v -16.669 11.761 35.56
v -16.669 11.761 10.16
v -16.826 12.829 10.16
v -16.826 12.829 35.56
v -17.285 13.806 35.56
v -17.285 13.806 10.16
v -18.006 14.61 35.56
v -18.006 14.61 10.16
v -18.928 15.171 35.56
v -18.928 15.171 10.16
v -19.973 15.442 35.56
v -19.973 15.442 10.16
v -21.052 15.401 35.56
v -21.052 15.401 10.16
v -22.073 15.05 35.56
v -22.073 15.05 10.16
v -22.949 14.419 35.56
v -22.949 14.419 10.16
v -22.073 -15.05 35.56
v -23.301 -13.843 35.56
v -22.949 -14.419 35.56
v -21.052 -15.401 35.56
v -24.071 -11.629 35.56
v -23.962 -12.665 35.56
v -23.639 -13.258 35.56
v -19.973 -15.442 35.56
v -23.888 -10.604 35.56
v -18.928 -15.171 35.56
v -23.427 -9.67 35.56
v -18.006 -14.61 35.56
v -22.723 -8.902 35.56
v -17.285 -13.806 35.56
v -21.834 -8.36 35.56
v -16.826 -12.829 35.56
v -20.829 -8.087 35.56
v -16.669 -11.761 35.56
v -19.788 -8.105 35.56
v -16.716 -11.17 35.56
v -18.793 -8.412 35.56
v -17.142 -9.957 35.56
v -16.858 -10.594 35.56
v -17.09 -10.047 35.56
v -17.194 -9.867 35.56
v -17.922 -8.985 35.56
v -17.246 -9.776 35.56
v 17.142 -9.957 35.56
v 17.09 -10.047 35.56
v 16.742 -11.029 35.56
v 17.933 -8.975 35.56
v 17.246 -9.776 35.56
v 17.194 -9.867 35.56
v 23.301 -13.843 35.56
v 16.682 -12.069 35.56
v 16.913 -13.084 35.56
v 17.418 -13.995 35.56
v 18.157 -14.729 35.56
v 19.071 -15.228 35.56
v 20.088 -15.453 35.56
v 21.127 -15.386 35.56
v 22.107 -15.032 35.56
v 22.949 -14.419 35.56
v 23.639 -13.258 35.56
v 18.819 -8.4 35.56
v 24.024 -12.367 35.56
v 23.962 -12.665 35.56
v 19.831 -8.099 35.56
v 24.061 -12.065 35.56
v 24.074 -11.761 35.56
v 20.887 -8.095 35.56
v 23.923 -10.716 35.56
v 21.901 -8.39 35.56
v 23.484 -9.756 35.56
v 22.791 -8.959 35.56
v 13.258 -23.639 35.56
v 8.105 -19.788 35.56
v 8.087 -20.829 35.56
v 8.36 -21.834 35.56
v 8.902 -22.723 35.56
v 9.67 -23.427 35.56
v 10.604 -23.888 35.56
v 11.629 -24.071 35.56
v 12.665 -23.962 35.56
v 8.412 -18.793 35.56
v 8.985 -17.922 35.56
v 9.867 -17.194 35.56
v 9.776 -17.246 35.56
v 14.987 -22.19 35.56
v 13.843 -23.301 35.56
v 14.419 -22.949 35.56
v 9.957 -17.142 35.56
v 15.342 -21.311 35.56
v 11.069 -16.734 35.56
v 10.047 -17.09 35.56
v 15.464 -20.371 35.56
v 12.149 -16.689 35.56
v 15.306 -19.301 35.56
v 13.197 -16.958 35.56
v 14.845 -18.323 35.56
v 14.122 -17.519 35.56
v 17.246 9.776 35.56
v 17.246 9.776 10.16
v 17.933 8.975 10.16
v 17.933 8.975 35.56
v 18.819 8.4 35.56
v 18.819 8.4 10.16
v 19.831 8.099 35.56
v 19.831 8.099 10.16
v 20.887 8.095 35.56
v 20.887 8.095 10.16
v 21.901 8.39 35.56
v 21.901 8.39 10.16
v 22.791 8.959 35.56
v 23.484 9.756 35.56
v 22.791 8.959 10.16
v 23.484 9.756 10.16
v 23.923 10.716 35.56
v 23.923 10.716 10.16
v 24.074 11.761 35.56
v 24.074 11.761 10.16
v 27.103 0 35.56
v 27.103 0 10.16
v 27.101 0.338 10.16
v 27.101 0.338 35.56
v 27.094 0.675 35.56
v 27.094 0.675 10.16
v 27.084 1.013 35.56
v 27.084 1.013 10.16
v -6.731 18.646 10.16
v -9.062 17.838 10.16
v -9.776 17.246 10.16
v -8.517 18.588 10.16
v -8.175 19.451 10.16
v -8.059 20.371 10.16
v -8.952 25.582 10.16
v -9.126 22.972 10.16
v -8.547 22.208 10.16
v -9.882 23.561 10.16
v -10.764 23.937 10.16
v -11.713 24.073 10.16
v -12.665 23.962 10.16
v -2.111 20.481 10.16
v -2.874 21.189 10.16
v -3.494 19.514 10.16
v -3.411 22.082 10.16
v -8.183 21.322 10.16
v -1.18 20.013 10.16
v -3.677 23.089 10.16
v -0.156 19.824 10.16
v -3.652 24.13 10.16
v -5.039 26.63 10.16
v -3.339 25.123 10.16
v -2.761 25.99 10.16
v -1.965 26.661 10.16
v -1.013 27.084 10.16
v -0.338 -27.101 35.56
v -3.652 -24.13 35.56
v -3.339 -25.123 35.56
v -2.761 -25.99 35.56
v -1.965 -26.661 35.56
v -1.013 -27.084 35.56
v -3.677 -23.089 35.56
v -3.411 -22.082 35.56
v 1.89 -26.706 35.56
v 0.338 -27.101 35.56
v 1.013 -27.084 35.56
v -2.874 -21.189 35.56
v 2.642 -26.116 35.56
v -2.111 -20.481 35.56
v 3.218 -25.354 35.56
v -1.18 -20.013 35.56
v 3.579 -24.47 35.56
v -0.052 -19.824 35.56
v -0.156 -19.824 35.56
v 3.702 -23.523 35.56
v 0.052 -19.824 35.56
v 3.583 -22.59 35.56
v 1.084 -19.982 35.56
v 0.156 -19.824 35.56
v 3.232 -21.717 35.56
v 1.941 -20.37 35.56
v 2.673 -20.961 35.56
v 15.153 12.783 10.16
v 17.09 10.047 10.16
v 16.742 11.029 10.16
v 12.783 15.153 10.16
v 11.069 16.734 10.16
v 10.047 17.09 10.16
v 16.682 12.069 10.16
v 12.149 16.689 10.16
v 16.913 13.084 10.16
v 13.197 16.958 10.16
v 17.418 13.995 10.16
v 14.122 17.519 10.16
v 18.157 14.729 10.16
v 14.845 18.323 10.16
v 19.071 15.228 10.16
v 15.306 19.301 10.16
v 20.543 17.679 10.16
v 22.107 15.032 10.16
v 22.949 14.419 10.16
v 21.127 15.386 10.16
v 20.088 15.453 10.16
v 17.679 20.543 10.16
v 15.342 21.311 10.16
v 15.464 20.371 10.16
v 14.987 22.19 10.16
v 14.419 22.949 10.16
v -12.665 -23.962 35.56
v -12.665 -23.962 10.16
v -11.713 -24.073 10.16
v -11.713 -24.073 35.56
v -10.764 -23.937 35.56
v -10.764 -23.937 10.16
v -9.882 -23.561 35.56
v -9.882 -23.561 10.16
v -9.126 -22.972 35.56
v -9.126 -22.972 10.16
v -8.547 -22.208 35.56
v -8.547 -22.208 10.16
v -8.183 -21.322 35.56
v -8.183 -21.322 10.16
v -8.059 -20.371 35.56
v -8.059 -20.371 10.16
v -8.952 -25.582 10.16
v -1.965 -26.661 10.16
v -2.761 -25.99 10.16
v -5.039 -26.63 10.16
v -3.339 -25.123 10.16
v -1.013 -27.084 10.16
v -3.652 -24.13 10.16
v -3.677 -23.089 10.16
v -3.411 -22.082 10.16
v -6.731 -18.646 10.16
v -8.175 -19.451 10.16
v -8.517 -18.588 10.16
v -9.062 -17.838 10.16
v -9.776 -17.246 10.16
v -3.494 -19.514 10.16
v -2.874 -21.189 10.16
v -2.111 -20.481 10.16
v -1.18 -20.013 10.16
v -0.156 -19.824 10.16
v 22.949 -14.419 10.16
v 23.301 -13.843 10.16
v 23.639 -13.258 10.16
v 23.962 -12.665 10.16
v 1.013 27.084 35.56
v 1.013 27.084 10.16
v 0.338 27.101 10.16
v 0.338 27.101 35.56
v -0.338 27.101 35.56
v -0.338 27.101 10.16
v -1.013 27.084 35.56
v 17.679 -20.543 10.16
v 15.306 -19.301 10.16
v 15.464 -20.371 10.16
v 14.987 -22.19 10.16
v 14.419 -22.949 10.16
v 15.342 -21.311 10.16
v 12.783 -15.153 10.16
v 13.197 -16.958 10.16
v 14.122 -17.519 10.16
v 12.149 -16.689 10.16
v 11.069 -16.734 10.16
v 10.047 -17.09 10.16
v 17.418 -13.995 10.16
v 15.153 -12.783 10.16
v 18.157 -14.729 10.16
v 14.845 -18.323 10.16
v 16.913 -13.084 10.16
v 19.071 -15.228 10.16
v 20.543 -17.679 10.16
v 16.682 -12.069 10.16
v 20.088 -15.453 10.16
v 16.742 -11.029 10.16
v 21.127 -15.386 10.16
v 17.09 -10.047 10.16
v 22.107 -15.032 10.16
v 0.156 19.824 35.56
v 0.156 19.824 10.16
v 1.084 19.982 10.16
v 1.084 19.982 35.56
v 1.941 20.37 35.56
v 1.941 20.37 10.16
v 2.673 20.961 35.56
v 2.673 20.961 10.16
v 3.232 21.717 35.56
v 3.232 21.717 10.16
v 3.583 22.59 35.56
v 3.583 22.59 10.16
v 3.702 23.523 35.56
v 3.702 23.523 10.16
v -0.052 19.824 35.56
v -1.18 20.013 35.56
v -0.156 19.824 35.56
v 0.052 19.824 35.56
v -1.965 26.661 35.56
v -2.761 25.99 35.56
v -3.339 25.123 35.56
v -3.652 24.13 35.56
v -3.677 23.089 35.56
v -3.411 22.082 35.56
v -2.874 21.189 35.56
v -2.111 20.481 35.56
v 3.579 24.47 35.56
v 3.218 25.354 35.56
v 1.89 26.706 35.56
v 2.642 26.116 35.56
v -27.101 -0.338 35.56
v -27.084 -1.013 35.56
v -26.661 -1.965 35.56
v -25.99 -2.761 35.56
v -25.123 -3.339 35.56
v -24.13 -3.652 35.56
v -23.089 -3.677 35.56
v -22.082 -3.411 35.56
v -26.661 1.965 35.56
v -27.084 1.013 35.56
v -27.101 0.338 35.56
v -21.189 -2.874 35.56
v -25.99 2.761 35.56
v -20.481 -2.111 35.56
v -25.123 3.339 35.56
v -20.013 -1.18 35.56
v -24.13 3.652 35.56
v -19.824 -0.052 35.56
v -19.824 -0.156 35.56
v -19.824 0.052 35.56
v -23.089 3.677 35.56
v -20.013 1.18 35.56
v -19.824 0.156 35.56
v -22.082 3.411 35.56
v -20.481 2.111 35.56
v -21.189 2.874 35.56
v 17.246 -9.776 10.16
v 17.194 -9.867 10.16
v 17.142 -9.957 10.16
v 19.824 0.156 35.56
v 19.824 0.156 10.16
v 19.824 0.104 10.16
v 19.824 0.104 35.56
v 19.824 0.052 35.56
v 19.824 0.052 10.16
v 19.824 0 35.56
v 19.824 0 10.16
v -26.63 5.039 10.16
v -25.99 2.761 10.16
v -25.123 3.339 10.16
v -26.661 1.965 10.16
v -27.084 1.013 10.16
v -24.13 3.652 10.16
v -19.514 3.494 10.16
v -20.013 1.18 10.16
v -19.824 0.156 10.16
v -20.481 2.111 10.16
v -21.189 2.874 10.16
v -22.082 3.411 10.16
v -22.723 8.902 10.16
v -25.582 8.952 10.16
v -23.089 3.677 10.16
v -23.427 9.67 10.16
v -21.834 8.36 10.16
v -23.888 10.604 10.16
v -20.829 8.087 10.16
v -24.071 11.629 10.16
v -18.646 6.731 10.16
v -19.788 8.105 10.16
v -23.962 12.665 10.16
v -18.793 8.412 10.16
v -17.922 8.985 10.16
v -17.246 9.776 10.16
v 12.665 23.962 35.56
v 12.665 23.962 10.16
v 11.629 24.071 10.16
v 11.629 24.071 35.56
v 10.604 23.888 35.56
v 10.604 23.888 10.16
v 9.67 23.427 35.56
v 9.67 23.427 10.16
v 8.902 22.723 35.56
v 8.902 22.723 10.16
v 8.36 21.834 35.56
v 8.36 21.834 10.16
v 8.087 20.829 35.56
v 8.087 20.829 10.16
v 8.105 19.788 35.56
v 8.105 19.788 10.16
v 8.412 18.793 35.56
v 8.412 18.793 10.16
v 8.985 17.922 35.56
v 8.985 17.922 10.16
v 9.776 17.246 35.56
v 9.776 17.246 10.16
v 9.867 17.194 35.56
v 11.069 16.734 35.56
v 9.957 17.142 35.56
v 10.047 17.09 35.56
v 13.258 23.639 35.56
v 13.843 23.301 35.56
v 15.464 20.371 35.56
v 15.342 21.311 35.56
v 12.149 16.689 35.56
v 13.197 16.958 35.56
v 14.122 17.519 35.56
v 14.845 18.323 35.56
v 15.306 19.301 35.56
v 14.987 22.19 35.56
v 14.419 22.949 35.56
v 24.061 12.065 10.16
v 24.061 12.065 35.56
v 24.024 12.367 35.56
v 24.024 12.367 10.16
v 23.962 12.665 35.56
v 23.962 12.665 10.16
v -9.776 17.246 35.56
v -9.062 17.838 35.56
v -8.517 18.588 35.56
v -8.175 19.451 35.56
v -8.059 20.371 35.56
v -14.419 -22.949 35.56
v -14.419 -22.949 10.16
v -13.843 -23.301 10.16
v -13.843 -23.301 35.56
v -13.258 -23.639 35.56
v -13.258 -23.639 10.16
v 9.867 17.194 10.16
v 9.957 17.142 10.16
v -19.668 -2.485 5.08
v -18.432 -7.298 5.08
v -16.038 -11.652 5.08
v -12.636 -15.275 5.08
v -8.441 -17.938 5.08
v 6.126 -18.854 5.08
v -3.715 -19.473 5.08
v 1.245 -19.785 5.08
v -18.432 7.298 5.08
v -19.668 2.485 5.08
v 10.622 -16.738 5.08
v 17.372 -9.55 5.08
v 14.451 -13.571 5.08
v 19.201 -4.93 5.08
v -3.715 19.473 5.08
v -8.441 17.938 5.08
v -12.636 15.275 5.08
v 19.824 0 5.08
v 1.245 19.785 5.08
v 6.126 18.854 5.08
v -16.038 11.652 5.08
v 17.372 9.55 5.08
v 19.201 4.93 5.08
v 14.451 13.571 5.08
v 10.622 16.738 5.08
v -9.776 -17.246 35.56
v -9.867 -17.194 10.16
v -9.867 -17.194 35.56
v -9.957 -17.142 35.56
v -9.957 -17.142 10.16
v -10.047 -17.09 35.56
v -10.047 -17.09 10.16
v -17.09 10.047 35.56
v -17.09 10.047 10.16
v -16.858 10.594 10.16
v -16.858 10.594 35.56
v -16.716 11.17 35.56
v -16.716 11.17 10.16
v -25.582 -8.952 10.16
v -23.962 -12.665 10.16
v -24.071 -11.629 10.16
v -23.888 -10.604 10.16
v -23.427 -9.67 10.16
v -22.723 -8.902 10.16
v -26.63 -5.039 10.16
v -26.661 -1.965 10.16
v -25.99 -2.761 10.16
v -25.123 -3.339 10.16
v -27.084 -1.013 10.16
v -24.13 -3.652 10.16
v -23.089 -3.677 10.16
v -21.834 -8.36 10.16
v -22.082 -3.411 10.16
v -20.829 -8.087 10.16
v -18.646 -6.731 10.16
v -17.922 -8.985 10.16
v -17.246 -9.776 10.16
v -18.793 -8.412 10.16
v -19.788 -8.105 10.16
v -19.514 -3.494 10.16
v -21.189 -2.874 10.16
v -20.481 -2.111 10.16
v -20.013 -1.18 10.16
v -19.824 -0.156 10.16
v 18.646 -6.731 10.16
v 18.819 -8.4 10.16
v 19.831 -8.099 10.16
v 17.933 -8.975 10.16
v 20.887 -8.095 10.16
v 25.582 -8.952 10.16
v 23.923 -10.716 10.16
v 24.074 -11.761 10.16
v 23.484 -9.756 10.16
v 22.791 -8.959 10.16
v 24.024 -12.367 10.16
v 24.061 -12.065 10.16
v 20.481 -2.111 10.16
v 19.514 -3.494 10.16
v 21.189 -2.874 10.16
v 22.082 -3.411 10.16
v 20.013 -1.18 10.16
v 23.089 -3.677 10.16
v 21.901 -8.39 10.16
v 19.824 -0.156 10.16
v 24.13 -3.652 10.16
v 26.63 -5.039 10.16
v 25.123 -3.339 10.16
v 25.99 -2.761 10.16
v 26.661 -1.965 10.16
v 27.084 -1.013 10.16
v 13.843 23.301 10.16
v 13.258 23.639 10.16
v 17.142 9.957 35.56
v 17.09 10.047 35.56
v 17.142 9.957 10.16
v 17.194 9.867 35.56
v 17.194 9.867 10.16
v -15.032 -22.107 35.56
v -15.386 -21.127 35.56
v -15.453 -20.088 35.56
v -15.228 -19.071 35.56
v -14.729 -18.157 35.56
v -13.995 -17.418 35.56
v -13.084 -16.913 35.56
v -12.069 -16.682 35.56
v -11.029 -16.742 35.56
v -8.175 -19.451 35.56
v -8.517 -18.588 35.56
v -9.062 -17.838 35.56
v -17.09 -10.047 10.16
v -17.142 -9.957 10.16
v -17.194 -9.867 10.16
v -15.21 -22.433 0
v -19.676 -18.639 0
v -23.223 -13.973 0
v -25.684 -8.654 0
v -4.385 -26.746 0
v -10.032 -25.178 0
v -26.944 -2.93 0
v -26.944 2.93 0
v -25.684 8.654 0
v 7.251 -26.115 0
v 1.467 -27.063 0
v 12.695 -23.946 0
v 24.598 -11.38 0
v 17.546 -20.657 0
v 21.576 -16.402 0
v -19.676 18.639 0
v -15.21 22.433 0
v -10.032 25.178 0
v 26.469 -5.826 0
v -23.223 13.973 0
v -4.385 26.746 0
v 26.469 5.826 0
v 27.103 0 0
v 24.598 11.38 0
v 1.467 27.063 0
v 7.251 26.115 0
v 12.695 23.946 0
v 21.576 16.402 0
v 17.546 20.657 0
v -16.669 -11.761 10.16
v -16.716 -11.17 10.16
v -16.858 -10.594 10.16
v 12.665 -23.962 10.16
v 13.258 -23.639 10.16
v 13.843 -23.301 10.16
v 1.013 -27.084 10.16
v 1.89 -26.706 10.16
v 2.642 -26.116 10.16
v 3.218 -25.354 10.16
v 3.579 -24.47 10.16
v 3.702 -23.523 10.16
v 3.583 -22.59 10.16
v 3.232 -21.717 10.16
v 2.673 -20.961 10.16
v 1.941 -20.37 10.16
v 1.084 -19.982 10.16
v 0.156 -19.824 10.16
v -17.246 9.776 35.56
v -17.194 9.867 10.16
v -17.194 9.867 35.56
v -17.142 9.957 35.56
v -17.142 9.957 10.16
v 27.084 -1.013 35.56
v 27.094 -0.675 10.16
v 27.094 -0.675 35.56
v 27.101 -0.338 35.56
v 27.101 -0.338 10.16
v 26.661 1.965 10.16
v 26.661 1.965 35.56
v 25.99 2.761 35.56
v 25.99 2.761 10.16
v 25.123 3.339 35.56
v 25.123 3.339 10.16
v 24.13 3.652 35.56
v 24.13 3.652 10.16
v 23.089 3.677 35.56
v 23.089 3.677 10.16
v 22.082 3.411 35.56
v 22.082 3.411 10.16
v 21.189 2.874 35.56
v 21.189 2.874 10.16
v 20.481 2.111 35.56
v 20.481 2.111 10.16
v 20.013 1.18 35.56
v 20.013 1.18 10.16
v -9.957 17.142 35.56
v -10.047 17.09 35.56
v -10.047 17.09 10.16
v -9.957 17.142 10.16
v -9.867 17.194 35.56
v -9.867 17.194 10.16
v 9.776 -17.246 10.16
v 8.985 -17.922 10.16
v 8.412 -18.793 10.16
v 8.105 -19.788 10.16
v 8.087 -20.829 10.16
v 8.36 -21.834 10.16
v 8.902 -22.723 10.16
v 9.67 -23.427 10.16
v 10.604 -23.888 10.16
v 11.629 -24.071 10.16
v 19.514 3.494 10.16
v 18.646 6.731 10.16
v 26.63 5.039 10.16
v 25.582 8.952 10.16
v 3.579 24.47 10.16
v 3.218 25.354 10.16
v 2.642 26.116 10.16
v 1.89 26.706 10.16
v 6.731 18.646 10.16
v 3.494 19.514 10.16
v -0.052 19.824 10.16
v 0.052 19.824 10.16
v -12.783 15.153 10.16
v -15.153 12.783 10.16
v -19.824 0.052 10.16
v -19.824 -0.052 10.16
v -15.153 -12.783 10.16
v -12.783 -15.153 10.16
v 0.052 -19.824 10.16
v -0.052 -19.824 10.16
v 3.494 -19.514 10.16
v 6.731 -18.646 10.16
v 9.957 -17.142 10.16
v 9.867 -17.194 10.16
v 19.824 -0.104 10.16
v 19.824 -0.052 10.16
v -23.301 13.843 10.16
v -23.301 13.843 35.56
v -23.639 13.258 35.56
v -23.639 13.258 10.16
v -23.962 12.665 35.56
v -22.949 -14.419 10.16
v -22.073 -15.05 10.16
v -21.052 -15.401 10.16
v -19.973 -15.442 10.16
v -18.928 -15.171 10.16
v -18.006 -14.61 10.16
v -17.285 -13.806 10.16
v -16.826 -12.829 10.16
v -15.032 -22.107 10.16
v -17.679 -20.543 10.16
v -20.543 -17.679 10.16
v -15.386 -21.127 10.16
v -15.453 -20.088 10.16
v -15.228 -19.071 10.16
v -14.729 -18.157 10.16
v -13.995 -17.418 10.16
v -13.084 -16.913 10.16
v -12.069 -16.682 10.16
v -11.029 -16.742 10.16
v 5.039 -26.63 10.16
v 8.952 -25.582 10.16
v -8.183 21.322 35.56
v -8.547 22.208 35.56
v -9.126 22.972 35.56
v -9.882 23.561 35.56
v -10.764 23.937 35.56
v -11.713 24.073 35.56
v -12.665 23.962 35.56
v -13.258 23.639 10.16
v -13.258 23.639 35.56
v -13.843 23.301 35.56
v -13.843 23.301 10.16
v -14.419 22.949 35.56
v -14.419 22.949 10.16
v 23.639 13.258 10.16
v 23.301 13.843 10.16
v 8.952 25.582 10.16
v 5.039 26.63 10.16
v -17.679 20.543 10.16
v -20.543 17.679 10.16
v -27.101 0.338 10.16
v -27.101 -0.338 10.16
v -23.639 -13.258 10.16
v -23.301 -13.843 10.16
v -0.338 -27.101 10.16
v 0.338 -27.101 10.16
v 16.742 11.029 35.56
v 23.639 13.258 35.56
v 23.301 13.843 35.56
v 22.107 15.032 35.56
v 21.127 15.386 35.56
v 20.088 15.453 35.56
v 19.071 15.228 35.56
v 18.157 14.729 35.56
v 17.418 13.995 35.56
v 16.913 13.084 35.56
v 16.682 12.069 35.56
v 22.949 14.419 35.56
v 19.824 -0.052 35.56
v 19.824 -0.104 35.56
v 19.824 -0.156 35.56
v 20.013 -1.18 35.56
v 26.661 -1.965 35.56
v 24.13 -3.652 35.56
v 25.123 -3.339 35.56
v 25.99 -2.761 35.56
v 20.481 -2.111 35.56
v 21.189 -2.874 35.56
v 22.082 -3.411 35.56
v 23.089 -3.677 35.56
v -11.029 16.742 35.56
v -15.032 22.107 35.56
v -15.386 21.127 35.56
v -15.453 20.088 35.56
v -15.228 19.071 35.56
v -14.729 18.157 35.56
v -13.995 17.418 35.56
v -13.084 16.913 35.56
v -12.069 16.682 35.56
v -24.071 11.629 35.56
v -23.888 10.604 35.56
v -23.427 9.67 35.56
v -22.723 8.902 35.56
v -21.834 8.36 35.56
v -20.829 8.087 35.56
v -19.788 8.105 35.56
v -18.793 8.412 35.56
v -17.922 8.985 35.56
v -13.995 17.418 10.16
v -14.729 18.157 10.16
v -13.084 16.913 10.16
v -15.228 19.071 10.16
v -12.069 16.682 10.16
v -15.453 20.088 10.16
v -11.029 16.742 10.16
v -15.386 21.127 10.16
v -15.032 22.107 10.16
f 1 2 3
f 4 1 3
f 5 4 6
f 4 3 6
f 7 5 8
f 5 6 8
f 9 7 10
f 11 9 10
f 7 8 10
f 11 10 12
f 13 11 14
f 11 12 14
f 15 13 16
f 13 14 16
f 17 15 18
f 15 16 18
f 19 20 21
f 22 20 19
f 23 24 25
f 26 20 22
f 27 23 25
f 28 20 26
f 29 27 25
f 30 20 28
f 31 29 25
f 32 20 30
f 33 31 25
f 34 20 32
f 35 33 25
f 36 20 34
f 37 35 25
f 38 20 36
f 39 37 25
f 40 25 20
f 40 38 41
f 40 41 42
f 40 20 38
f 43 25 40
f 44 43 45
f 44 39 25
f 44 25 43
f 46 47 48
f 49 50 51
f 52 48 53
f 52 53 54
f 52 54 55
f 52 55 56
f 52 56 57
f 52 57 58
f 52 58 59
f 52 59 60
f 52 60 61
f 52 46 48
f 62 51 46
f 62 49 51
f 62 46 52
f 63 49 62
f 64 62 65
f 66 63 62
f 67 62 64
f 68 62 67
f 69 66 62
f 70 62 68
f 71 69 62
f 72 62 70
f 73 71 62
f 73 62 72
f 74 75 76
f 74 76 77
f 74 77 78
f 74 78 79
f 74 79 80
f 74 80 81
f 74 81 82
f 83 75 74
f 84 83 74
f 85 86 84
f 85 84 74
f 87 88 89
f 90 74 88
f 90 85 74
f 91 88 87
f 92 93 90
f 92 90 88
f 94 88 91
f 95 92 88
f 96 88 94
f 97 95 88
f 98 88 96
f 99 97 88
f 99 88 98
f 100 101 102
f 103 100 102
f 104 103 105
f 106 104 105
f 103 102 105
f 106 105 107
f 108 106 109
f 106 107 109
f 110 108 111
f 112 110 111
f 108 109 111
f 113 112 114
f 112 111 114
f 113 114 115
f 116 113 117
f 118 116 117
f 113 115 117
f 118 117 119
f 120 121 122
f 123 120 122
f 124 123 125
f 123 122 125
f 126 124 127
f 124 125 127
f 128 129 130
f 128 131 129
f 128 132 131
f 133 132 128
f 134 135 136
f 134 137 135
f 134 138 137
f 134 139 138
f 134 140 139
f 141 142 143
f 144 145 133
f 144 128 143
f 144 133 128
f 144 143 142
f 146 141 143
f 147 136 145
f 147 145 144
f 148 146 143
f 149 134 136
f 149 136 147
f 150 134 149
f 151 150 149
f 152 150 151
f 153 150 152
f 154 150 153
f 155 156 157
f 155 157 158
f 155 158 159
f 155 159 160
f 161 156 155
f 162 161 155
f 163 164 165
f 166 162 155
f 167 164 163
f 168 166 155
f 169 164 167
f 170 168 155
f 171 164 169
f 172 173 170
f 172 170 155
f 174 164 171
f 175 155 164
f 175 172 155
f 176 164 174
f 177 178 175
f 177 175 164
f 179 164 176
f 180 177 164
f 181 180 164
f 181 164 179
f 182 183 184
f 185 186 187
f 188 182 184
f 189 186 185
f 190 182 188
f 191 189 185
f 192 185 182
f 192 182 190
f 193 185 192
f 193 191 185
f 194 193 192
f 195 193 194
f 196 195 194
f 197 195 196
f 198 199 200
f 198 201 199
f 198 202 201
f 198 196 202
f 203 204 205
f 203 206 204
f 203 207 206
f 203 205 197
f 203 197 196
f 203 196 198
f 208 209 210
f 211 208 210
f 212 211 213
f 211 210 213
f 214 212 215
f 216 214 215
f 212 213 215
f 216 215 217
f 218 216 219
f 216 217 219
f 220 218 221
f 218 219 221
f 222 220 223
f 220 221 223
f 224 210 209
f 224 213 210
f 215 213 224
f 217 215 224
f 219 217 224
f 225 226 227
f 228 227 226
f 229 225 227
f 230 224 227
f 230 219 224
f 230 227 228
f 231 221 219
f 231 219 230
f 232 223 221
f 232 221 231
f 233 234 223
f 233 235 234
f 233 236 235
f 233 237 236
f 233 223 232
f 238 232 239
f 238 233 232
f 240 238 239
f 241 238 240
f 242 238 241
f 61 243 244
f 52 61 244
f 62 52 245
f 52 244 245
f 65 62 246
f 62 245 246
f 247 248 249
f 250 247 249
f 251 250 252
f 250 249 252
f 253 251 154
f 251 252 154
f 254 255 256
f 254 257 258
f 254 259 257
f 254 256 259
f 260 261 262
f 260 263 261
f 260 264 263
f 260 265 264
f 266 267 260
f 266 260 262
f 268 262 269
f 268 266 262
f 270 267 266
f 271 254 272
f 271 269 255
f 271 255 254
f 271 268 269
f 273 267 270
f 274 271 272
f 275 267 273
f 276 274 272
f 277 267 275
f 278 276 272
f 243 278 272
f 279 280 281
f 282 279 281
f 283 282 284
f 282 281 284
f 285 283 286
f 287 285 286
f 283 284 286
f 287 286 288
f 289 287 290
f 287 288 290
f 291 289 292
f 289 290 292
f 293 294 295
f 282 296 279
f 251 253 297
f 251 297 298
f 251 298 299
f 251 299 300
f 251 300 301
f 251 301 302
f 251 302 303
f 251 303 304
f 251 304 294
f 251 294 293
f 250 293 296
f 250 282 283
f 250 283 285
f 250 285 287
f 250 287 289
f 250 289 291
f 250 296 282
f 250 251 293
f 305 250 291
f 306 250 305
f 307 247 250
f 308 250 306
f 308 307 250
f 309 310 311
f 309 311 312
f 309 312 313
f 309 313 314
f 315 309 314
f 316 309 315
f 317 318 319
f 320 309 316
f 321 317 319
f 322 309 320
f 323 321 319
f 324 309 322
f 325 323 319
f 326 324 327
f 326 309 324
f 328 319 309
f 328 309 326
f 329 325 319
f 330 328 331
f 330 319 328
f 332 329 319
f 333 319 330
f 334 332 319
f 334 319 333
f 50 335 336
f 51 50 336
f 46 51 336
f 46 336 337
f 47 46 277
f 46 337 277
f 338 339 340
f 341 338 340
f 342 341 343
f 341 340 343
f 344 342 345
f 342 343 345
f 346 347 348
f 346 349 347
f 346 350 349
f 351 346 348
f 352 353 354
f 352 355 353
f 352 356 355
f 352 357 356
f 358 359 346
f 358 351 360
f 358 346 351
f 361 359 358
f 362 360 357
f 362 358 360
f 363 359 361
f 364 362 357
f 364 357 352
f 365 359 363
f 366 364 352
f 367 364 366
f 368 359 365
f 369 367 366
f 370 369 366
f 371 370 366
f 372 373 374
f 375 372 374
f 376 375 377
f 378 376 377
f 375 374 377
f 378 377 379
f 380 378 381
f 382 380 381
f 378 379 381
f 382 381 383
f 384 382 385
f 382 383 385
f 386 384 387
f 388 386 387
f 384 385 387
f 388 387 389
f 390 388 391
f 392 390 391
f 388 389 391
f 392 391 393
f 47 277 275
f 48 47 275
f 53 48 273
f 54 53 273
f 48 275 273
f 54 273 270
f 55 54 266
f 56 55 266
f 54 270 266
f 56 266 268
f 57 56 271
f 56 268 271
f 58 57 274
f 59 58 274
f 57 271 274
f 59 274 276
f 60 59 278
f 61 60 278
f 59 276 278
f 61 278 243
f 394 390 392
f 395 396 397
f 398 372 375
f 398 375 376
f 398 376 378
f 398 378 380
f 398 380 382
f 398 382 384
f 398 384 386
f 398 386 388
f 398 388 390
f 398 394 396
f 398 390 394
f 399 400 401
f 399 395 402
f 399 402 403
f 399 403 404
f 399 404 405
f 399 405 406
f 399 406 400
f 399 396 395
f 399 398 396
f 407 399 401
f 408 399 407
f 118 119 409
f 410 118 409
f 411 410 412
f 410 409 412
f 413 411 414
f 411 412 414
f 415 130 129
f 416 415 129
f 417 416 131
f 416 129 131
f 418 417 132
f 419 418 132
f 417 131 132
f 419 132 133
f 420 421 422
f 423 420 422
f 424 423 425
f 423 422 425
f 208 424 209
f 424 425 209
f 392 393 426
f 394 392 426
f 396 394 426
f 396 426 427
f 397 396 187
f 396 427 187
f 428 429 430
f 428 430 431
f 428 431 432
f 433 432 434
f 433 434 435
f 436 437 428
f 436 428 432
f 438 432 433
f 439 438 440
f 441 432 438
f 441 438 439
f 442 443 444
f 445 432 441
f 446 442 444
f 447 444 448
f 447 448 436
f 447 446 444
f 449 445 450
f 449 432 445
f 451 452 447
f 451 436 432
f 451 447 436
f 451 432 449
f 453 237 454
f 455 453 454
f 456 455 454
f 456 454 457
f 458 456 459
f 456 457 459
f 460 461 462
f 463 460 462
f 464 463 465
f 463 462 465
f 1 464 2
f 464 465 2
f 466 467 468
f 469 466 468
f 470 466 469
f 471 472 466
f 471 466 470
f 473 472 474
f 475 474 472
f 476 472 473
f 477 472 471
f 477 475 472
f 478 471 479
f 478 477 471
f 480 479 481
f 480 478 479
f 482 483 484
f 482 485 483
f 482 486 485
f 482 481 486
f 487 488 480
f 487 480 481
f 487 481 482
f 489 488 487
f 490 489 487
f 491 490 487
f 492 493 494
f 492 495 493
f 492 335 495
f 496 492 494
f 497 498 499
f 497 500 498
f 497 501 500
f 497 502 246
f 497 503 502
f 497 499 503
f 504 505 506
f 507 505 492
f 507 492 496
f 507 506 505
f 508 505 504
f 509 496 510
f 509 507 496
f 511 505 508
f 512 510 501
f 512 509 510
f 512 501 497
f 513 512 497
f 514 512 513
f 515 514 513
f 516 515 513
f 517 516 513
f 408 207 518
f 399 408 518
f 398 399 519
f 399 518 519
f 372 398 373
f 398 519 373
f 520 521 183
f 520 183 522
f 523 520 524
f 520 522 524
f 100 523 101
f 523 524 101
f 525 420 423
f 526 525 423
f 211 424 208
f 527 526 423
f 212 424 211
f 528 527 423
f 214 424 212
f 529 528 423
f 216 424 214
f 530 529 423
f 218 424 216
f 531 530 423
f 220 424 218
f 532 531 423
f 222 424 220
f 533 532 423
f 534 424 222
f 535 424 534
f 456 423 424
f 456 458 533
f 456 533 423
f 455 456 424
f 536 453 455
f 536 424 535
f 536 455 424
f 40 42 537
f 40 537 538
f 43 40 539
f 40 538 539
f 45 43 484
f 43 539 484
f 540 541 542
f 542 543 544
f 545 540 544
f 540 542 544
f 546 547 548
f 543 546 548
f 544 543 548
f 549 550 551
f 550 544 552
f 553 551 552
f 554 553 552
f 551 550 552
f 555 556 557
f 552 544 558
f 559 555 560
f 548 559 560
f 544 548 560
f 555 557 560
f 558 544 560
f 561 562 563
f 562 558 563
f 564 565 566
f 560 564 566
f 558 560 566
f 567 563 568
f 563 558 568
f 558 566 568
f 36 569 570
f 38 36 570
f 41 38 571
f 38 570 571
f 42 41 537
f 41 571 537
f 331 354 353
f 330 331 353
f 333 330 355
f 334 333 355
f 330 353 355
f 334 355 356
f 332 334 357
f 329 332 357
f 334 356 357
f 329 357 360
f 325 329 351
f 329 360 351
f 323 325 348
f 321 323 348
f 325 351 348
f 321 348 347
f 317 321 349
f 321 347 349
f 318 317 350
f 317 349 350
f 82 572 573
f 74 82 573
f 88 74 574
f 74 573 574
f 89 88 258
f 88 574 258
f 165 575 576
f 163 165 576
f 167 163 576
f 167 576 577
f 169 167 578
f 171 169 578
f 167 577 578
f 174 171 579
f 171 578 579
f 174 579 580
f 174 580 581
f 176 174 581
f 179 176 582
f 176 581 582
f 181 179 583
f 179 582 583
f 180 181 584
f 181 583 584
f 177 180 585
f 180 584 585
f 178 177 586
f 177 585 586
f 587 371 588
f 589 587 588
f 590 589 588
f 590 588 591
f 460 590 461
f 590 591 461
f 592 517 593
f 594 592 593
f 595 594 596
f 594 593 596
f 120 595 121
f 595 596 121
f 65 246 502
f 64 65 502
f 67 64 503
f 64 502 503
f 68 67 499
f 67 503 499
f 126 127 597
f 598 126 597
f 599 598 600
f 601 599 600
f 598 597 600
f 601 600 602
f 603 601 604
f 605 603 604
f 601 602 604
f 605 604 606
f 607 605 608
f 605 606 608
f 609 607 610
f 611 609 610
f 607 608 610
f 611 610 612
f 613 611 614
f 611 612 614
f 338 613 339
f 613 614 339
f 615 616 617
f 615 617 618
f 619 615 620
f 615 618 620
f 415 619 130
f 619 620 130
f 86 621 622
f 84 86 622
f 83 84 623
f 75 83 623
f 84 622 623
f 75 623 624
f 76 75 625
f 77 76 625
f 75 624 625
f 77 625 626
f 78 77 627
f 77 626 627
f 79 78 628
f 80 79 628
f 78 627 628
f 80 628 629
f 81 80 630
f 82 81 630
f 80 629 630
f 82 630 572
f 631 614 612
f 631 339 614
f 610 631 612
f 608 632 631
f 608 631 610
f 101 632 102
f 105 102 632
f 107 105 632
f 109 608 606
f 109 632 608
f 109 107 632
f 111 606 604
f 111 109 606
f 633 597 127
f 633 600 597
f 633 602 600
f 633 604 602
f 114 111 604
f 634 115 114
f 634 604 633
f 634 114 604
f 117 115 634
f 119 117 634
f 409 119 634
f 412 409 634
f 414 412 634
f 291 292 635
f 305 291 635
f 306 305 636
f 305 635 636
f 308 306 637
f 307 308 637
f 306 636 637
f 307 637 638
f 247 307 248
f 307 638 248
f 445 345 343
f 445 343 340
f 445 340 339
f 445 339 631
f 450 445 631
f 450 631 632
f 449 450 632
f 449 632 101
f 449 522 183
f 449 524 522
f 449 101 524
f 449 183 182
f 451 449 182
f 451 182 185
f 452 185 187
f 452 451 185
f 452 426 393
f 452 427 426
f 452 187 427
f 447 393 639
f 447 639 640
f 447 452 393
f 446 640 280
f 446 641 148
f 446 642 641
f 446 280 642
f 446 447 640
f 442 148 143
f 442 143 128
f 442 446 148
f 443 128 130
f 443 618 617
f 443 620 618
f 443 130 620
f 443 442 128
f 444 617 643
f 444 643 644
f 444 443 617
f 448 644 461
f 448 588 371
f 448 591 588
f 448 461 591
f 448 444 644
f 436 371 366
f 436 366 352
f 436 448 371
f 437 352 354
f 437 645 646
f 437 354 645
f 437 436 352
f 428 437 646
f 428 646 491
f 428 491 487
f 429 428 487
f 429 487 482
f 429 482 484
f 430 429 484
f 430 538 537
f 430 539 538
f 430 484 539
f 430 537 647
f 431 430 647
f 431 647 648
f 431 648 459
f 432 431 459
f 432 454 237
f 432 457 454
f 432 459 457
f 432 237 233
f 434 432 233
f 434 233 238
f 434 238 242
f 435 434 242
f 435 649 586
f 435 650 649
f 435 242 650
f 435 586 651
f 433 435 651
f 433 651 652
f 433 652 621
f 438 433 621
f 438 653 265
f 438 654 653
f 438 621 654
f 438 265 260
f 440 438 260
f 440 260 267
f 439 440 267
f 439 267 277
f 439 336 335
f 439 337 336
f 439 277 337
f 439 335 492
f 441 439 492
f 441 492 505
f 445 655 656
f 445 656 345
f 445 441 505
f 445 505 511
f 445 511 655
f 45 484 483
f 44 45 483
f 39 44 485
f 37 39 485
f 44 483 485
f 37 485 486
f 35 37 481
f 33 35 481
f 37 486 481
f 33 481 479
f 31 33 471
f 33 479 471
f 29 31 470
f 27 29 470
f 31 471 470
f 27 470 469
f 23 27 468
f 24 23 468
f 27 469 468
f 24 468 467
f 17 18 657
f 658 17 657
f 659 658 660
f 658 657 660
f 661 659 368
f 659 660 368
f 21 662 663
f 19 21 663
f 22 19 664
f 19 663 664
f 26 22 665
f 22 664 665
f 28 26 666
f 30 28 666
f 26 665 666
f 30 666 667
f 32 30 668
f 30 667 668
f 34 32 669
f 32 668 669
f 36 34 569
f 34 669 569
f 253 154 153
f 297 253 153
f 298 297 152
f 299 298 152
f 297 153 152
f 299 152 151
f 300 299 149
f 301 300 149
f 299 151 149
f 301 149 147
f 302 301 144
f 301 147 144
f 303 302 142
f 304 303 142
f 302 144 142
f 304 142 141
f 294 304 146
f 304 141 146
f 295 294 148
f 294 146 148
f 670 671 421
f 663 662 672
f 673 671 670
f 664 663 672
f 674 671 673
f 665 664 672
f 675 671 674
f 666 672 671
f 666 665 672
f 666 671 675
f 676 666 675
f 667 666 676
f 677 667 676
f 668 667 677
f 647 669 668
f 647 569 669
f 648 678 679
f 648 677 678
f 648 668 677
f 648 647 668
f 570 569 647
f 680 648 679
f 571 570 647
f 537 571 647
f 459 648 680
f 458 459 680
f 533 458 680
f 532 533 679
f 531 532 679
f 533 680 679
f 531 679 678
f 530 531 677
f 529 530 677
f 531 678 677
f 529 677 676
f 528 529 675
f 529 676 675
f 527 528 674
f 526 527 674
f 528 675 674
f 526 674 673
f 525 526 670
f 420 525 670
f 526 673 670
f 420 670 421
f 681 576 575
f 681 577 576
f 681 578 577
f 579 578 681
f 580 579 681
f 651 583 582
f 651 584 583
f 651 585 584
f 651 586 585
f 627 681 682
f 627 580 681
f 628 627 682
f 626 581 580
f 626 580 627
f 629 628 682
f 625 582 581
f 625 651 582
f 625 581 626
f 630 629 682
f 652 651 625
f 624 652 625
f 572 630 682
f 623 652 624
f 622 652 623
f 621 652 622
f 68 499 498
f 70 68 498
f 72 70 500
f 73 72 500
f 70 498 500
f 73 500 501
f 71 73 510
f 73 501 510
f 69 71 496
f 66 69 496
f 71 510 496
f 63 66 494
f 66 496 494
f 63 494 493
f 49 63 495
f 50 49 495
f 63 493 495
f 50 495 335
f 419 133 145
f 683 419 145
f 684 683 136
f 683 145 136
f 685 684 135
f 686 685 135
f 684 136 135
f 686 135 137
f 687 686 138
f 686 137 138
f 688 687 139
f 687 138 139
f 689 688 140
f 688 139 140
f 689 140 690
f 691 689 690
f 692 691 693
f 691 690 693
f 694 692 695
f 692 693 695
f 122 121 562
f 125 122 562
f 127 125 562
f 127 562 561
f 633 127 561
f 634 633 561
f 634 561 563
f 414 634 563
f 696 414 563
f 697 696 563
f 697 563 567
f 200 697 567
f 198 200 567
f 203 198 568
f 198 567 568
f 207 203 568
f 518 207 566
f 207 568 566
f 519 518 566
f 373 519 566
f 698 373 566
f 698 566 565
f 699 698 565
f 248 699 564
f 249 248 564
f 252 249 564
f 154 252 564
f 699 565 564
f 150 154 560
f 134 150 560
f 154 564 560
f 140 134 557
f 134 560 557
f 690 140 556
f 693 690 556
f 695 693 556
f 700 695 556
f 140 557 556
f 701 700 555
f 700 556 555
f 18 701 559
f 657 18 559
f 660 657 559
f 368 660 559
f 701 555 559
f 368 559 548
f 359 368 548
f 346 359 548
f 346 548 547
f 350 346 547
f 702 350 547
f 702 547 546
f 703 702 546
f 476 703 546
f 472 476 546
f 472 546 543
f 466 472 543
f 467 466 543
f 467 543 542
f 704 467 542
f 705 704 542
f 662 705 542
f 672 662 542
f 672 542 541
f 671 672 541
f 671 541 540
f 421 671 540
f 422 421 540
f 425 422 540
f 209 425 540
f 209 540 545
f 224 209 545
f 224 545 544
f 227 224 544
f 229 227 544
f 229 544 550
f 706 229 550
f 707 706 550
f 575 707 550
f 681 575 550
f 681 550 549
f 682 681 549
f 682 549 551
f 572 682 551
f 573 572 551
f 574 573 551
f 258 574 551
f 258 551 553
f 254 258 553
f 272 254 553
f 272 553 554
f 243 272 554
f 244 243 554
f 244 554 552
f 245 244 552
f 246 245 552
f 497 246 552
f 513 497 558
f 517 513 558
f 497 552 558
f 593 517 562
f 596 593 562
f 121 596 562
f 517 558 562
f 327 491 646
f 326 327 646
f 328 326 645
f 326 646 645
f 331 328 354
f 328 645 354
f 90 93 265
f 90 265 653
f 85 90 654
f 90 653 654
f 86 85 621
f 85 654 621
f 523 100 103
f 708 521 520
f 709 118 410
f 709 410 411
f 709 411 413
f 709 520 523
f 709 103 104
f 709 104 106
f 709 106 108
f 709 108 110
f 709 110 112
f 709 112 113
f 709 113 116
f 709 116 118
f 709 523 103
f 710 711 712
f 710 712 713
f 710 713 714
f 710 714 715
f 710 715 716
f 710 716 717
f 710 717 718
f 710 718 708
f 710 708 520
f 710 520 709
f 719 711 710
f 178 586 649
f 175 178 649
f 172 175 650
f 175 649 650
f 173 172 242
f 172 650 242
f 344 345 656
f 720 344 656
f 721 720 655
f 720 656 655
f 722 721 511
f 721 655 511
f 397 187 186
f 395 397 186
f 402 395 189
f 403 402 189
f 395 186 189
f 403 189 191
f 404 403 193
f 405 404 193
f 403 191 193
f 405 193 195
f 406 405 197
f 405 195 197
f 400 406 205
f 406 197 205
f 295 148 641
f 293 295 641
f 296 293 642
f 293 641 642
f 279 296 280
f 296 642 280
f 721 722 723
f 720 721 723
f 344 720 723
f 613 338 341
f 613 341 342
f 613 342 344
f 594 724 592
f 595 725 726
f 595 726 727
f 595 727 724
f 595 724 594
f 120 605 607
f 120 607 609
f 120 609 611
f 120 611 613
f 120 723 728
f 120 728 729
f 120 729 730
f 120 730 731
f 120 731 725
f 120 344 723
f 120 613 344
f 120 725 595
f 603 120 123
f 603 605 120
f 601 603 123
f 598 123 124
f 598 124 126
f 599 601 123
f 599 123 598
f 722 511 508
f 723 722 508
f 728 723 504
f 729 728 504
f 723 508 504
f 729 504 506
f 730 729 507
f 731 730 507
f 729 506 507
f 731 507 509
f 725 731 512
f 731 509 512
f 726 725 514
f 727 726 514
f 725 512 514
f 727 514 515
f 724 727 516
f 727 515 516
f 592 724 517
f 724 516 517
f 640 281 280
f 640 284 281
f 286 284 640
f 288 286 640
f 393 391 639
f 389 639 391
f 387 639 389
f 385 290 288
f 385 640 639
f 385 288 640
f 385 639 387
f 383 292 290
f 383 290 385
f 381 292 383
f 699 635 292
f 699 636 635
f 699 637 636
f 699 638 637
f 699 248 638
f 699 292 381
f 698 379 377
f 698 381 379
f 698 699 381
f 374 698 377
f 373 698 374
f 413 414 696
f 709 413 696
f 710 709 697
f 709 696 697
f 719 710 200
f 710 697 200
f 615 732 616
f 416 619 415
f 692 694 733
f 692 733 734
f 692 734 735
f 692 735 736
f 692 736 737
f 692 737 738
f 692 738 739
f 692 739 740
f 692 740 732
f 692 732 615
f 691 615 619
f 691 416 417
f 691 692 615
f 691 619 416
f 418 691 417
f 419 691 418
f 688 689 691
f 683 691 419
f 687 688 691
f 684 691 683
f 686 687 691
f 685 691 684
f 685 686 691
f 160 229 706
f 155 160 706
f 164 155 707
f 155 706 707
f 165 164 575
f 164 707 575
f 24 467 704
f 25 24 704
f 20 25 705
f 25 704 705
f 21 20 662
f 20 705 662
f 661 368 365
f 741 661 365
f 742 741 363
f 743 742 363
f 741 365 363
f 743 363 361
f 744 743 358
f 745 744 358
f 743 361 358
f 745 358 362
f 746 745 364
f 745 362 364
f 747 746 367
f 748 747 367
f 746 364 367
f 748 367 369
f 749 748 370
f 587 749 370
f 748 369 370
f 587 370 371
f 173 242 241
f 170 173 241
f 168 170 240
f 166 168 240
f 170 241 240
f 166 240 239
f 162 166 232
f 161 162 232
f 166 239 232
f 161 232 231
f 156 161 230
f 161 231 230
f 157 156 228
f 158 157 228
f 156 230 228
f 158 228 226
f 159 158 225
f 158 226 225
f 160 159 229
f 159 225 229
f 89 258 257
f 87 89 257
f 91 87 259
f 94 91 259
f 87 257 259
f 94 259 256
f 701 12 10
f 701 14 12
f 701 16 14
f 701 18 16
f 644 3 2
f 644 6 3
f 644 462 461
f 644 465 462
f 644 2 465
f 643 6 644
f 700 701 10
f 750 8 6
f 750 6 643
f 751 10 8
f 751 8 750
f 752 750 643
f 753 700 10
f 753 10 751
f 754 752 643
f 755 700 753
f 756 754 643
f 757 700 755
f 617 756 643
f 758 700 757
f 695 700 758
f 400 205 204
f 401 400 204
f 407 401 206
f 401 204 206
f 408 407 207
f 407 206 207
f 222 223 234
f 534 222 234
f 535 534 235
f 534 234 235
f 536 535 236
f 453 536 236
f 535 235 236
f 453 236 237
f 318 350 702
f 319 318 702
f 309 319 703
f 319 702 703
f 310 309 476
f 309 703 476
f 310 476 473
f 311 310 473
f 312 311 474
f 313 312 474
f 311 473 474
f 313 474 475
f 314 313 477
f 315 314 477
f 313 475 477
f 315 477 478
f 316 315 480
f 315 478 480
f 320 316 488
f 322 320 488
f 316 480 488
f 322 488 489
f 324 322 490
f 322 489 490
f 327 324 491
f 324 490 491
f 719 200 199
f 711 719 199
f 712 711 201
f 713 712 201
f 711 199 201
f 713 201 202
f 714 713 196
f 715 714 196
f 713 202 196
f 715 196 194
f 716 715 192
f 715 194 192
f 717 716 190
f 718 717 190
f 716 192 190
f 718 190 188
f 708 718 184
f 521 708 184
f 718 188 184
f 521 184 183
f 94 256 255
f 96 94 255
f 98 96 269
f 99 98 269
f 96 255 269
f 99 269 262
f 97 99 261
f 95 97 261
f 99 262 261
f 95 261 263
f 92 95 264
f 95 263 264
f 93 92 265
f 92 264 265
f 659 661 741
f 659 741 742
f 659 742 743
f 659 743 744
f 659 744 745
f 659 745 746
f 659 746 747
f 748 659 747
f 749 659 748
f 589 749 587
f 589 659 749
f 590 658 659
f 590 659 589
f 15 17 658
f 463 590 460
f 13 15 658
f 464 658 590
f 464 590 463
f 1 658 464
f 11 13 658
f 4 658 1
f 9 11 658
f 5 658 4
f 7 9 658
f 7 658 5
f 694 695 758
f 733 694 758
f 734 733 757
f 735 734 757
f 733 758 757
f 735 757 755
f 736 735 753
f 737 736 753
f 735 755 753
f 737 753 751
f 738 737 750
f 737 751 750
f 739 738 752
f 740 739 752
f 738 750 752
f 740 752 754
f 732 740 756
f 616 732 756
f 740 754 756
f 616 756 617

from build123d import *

# Parameters (mm, degrees)
F0_R     = 19.8242320165
F1_DEPTH = 5.08
F0_R_2   = 27.1027644971
F2_DEPTH = 10.16
F4_DEPTH = 25.4


with BuildPart() as f1:
    # F0 (on Top) → F1 (new body)
    with BuildSketch(Plane.XY):
        Circle(F0_R)
    extrude(amount=F1_DEPTH)

    # F0 (on Top) → F2 (join)
    with BuildSketch(Plane.XY):
        Circle(F0_R_2)
        Circle(F0_R, mode=Mode.SUBTRACT)
    extrude(amount=F2_DEPTH)

    # F3 (on face) → F4 (join)
    with BuildSketch(Plane.XY.offset(10.16)):
        with BuildLine():
            ThreePointArc((27.1027644971, 0), (27.0980286069, 0.5066448501), (27.0838225914, 1.0131126398))
            ThreePointArc((27.0838225914, 1.0131126398), (23.0888262615, 3.676897102), (19.823615331, 0.1563657619))
            ThreePointArc((19.823615331, 0.1563657619), (19.8240778445, 0.078183489), (19.8242320165, 0))
            ThreePointArc((19.8242320165, 0), (19.8240778445, -0.078183489), (19.823615331, -0.1563657619))
            ThreePointArc((19.823615331, -0.1563657619), (23.0888262615, -3.676897102), (27.0838225914, -1.0131126398))
            ThreePointArc((27.0838225914, -1.0131126398), (27.0980286069, -0.5066448501), (27.1027644971, 0))
        make_face()
        with BuildLine():
            ThreePointArc((24.0736841586, 11.7613608018), (24.0456154002, 12.2163951196), (23.9618347156, 12.6645300128))
            ThreePointArc((23.9618347156, 12.6645300128), (23.4716825672, 13.5513822485), (22.9487220759, 14.4192925786))
            ThreePointArc((22.9487220759, 14.4192925786), (18.157061535, 14.7286994282), (17.0895715906, 10.0472243876))
            ThreePointArc((17.0895715906, 10.0472243876), (17.1682885368, 9.9121160082), (17.2459373524, 9.7763909435))
            ThreePointArc((17.2459373524, 9.7763909435), (21.404850558, 8.206145204), (24.0736841586, 11.7613608018))
        make_face()
        with BuildLine():
            ThreePointArc((22.9487220759, -14.4192925786), (23.4716825672, -13.5513822485), (23.9618347156, -12.6645300128))
            ThreePointArc((23.9618347156, -12.6645300128), (24.0456154002, -12.2163951196), (24.0736841586, -11.7613608018))
            ThreePointArc((24.0736841586, -11.7613608018), (21.404850558, -8.206145204), (17.2459373524, -9.7763909435))
            ThreePointArc((17.2459373524, -9.7763909435), (17.1682885368, -9.9121160082), (17.0895715906, -10.0472243876))
            ThreePointArc((17.0895715906, -10.0472243876), (18.157061535, -14.7286994282), (22.9487220759, -14.4192925786))
        make_face()
        with BuildLine():
            ThreePointArc((15.4637704856, 20.3712744748), (15.1927300486, 21.7617932839), (14.4192925786, 22.9487220759))
            ThreePointArc((14.4192925786, 22.9487220759), (13.5513822485, 23.4716825672), (12.6645300128, 23.9618347156))
            ThreePointArc((12.6645300128, 23.9618347156), (8.3601268333, 21.833958637), (9.7763909435, 17.2459373524))
            ThreePointArc((9.7763909435, 17.2459373524), (9.9121160082, 17.1682885368), (10.0472243876, 17.0895715906))
            ThreePointArc((10.0472243876, 17.0895715906), (13.6798761402, 17.2047090858), (15.4637704856, 20.3712744748))
        make_face()
        with BuildLine():
            ThreePointArc((12.6645300128, -23.9618347156), (13.5513822485, -23.4716825672), (14.4192925786, -22.9487220759))
            ThreePointArc((14.4192925786, -22.9487220759), (15.1927300486, -21.7617932839), (15.4637704856, -20.3712744748))
            ThreePointArc((15.4637704856, -20.3712744748), (13.6798761402, -17.2047090858), (10.0472243876, -17.0895715906))
            ThreePointArc((10.0472243876, -17.0895715906), (9.9121160082, -17.1682885368), (9.7763909435, -17.2459373524))
            ThreePointArc((9.7763909435, -17.2459373524), (8.3601268333, -21.833958637), (12.6645300128, -23.9618347156))
        make_face()
        with BuildLine():
            ThreePointArc((3.7024096838, 23.5227216035), (2.9545554247, 25.7539633451), (1.0131126398, 27.0838225914))
            ThreePointArc((1.0131126398, 27.0838225914), (0, 27.1027644971), (-1.0131126398, 27.0838225914))
            ThreePointArc((-1.0131126398, 27.0838225914), (-3.676897102, 23.0888262615), (-0.1563657619, 19.823615331))
            ThreePointArc((-0.1563657619, 19.823615331), (0, 19.8242320165), (0.1563657619, 19.823615331))
            ThreePointArc((0.1563657619, 19.823615331), (2.6727109437, 20.9606026215), (3.7024096838, 23.5227216035))
        make_face()
        with BuildLine():
            ThreePointArc((-1.0131126398, -27.0838225914), (0, -27.1027644971), (1.0131126398, -27.0838225914))
            ThreePointArc((1.0131126398, -27.0838225914), (2.9545554247, -25.7539633451), (3.7024096838, -23.5227216035))
            ThreePointArc((3.7024096838, -23.5227216035), (2.6727109437, -20.9606026215), (0.1563657619, -19.823615331))
            ThreePointArc((0.1563657619, -19.823615331), (0, -19.8242320165), (-0.1563657619, -19.823615331))
            ThreePointArc((-0.1563657619, -19.823615331), (-3.676897102, -23.0888262615), (-1.0131126398, -27.0838225914))
        make_face()
        with BuildLine():
            ThreePointArc((-8.0589511179, 20.3712744748), (-9.4849672688, 23.2911837114), (-12.6645300128, 23.9618347156))
            ThreePointArc((-12.6645300128, 23.9618347156), (-13.5513822485, 23.4716825672), (-14.4192925786, 22.9487220759))
            ThreePointArc((-14.4192925786, 22.9487220759), (-14.7286994282, 18.157061535), (-10.0472243876, 17.0895715906))
            ThreePointArc((-10.0472243876, 17.0895715906), (-9.9121160082, 17.1682885368), (-9.7763909435, 17.2459373524))
            ThreePointArc((-9.7763909435, 17.2459373524), (-8.5165950866, 18.5882060743), (-8.0589511179, 20.3712744748))
        make_face()
        with BuildLine():
            ThreePointArc((-14.4192925786, -22.9487220759), (-13.5513822485, -23.4716825672), (-12.6645300128, -23.9618347156))
            ThreePointArc((-12.6645300128, -23.9618347156), (-9.4849672688, -23.2911837114), (-8.0589511179, -20.3712744748))
            ThreePointArc((-8.0589511179, -20.3712744748), (-8.5165950866, -18.5882060743), (-9.7763909435, -17.2459373524))
            ThreePointArc((-9.7763909435, -17.2459373524), (-9.9121160082, -17.1682885368), (-10.0472243876, -17.0895715906))
            ThreePointArc((-10.0472243876, -17.0895715906), (-14.7286994282, -18.157061535), (-14.4192925786, -22.9487220759))
        make_face()
        with BuildLine():
            ThreePointArc((-16.668864791, 11.7613608018), (-18.9281752909, 15.1709505443), (-22.9487220759, 14.4192925786))
            ThreePointArc((-22.9487220759, 14.4192925786), (-23.4716825672, 13.5513822485), (-23.9618347156, 12.6645300128))
            ThreePointArc((-23.9618347156, 12.6645300128), (-21.833958637, 8.3601268333), (-17.2459373524, 9.7763909435))
            ThreePointArc((-17.2459373524, 9.7763909435), (-17.1682885368, 9.9121160082), (-17.0895715906, 10.0472243876))
            ThreePointArc((-17.0895715906, 10.0472243876), (-16.7755794095, 10.8788561477), (-16.668864791, 11.7613608018))
        make_face()
        with BuildLine():
            ThreePointArc((-23.9618347156, -12.6645300128), (-23.4716825672, -13.5513822485), (-22.9487220759, -14.4192925786))
            ThreePointArc((-22.9487220759, -14.4192925786), (-18.9281752909, -15.1709505443), (-16.668864791, -11.7613608018))
            ThreePointArc((-16.668864791, -11.7613608018), (-16.7755794095, -10.8788561477), (-17.0895715906, -10.0472243876))
            ThreePointArc((-17.0895715906, -10.0472243876), (-17.1682885368, -9.9121160082), (-17.2459373524, -9.7763909435))
            ThreePointArc((-17.2459373524, -9.7763909435), (-21.833958637, -8.3601268333), (-23.9618347156, -12.6645300128))
        make_face()
        with BuildLine():
            ThreePointArc((-19.823615331, 0.1563657619), (-23.0888262615, 3.676897102), (-27.0838225914, 1.0131126398))
            ThreePointArc((-27.0838225914, 1.0131126398), (-27.1027644971, 0), (-27.0838225914, -1.0131126398))
            ThreePointArc((-27.0838225914, -1.0131126398), (-23.0888262615, -3.676897102), (-19.823615331, -0.1563657619))
            ThreePointArc((-19.823615331, -0.1563657619), (-19.8242320165, 0), (-19.823615331, 0.1563657619))
        make_face()
    extrude(amount=F4_DEPTH)


solid = f1.part
